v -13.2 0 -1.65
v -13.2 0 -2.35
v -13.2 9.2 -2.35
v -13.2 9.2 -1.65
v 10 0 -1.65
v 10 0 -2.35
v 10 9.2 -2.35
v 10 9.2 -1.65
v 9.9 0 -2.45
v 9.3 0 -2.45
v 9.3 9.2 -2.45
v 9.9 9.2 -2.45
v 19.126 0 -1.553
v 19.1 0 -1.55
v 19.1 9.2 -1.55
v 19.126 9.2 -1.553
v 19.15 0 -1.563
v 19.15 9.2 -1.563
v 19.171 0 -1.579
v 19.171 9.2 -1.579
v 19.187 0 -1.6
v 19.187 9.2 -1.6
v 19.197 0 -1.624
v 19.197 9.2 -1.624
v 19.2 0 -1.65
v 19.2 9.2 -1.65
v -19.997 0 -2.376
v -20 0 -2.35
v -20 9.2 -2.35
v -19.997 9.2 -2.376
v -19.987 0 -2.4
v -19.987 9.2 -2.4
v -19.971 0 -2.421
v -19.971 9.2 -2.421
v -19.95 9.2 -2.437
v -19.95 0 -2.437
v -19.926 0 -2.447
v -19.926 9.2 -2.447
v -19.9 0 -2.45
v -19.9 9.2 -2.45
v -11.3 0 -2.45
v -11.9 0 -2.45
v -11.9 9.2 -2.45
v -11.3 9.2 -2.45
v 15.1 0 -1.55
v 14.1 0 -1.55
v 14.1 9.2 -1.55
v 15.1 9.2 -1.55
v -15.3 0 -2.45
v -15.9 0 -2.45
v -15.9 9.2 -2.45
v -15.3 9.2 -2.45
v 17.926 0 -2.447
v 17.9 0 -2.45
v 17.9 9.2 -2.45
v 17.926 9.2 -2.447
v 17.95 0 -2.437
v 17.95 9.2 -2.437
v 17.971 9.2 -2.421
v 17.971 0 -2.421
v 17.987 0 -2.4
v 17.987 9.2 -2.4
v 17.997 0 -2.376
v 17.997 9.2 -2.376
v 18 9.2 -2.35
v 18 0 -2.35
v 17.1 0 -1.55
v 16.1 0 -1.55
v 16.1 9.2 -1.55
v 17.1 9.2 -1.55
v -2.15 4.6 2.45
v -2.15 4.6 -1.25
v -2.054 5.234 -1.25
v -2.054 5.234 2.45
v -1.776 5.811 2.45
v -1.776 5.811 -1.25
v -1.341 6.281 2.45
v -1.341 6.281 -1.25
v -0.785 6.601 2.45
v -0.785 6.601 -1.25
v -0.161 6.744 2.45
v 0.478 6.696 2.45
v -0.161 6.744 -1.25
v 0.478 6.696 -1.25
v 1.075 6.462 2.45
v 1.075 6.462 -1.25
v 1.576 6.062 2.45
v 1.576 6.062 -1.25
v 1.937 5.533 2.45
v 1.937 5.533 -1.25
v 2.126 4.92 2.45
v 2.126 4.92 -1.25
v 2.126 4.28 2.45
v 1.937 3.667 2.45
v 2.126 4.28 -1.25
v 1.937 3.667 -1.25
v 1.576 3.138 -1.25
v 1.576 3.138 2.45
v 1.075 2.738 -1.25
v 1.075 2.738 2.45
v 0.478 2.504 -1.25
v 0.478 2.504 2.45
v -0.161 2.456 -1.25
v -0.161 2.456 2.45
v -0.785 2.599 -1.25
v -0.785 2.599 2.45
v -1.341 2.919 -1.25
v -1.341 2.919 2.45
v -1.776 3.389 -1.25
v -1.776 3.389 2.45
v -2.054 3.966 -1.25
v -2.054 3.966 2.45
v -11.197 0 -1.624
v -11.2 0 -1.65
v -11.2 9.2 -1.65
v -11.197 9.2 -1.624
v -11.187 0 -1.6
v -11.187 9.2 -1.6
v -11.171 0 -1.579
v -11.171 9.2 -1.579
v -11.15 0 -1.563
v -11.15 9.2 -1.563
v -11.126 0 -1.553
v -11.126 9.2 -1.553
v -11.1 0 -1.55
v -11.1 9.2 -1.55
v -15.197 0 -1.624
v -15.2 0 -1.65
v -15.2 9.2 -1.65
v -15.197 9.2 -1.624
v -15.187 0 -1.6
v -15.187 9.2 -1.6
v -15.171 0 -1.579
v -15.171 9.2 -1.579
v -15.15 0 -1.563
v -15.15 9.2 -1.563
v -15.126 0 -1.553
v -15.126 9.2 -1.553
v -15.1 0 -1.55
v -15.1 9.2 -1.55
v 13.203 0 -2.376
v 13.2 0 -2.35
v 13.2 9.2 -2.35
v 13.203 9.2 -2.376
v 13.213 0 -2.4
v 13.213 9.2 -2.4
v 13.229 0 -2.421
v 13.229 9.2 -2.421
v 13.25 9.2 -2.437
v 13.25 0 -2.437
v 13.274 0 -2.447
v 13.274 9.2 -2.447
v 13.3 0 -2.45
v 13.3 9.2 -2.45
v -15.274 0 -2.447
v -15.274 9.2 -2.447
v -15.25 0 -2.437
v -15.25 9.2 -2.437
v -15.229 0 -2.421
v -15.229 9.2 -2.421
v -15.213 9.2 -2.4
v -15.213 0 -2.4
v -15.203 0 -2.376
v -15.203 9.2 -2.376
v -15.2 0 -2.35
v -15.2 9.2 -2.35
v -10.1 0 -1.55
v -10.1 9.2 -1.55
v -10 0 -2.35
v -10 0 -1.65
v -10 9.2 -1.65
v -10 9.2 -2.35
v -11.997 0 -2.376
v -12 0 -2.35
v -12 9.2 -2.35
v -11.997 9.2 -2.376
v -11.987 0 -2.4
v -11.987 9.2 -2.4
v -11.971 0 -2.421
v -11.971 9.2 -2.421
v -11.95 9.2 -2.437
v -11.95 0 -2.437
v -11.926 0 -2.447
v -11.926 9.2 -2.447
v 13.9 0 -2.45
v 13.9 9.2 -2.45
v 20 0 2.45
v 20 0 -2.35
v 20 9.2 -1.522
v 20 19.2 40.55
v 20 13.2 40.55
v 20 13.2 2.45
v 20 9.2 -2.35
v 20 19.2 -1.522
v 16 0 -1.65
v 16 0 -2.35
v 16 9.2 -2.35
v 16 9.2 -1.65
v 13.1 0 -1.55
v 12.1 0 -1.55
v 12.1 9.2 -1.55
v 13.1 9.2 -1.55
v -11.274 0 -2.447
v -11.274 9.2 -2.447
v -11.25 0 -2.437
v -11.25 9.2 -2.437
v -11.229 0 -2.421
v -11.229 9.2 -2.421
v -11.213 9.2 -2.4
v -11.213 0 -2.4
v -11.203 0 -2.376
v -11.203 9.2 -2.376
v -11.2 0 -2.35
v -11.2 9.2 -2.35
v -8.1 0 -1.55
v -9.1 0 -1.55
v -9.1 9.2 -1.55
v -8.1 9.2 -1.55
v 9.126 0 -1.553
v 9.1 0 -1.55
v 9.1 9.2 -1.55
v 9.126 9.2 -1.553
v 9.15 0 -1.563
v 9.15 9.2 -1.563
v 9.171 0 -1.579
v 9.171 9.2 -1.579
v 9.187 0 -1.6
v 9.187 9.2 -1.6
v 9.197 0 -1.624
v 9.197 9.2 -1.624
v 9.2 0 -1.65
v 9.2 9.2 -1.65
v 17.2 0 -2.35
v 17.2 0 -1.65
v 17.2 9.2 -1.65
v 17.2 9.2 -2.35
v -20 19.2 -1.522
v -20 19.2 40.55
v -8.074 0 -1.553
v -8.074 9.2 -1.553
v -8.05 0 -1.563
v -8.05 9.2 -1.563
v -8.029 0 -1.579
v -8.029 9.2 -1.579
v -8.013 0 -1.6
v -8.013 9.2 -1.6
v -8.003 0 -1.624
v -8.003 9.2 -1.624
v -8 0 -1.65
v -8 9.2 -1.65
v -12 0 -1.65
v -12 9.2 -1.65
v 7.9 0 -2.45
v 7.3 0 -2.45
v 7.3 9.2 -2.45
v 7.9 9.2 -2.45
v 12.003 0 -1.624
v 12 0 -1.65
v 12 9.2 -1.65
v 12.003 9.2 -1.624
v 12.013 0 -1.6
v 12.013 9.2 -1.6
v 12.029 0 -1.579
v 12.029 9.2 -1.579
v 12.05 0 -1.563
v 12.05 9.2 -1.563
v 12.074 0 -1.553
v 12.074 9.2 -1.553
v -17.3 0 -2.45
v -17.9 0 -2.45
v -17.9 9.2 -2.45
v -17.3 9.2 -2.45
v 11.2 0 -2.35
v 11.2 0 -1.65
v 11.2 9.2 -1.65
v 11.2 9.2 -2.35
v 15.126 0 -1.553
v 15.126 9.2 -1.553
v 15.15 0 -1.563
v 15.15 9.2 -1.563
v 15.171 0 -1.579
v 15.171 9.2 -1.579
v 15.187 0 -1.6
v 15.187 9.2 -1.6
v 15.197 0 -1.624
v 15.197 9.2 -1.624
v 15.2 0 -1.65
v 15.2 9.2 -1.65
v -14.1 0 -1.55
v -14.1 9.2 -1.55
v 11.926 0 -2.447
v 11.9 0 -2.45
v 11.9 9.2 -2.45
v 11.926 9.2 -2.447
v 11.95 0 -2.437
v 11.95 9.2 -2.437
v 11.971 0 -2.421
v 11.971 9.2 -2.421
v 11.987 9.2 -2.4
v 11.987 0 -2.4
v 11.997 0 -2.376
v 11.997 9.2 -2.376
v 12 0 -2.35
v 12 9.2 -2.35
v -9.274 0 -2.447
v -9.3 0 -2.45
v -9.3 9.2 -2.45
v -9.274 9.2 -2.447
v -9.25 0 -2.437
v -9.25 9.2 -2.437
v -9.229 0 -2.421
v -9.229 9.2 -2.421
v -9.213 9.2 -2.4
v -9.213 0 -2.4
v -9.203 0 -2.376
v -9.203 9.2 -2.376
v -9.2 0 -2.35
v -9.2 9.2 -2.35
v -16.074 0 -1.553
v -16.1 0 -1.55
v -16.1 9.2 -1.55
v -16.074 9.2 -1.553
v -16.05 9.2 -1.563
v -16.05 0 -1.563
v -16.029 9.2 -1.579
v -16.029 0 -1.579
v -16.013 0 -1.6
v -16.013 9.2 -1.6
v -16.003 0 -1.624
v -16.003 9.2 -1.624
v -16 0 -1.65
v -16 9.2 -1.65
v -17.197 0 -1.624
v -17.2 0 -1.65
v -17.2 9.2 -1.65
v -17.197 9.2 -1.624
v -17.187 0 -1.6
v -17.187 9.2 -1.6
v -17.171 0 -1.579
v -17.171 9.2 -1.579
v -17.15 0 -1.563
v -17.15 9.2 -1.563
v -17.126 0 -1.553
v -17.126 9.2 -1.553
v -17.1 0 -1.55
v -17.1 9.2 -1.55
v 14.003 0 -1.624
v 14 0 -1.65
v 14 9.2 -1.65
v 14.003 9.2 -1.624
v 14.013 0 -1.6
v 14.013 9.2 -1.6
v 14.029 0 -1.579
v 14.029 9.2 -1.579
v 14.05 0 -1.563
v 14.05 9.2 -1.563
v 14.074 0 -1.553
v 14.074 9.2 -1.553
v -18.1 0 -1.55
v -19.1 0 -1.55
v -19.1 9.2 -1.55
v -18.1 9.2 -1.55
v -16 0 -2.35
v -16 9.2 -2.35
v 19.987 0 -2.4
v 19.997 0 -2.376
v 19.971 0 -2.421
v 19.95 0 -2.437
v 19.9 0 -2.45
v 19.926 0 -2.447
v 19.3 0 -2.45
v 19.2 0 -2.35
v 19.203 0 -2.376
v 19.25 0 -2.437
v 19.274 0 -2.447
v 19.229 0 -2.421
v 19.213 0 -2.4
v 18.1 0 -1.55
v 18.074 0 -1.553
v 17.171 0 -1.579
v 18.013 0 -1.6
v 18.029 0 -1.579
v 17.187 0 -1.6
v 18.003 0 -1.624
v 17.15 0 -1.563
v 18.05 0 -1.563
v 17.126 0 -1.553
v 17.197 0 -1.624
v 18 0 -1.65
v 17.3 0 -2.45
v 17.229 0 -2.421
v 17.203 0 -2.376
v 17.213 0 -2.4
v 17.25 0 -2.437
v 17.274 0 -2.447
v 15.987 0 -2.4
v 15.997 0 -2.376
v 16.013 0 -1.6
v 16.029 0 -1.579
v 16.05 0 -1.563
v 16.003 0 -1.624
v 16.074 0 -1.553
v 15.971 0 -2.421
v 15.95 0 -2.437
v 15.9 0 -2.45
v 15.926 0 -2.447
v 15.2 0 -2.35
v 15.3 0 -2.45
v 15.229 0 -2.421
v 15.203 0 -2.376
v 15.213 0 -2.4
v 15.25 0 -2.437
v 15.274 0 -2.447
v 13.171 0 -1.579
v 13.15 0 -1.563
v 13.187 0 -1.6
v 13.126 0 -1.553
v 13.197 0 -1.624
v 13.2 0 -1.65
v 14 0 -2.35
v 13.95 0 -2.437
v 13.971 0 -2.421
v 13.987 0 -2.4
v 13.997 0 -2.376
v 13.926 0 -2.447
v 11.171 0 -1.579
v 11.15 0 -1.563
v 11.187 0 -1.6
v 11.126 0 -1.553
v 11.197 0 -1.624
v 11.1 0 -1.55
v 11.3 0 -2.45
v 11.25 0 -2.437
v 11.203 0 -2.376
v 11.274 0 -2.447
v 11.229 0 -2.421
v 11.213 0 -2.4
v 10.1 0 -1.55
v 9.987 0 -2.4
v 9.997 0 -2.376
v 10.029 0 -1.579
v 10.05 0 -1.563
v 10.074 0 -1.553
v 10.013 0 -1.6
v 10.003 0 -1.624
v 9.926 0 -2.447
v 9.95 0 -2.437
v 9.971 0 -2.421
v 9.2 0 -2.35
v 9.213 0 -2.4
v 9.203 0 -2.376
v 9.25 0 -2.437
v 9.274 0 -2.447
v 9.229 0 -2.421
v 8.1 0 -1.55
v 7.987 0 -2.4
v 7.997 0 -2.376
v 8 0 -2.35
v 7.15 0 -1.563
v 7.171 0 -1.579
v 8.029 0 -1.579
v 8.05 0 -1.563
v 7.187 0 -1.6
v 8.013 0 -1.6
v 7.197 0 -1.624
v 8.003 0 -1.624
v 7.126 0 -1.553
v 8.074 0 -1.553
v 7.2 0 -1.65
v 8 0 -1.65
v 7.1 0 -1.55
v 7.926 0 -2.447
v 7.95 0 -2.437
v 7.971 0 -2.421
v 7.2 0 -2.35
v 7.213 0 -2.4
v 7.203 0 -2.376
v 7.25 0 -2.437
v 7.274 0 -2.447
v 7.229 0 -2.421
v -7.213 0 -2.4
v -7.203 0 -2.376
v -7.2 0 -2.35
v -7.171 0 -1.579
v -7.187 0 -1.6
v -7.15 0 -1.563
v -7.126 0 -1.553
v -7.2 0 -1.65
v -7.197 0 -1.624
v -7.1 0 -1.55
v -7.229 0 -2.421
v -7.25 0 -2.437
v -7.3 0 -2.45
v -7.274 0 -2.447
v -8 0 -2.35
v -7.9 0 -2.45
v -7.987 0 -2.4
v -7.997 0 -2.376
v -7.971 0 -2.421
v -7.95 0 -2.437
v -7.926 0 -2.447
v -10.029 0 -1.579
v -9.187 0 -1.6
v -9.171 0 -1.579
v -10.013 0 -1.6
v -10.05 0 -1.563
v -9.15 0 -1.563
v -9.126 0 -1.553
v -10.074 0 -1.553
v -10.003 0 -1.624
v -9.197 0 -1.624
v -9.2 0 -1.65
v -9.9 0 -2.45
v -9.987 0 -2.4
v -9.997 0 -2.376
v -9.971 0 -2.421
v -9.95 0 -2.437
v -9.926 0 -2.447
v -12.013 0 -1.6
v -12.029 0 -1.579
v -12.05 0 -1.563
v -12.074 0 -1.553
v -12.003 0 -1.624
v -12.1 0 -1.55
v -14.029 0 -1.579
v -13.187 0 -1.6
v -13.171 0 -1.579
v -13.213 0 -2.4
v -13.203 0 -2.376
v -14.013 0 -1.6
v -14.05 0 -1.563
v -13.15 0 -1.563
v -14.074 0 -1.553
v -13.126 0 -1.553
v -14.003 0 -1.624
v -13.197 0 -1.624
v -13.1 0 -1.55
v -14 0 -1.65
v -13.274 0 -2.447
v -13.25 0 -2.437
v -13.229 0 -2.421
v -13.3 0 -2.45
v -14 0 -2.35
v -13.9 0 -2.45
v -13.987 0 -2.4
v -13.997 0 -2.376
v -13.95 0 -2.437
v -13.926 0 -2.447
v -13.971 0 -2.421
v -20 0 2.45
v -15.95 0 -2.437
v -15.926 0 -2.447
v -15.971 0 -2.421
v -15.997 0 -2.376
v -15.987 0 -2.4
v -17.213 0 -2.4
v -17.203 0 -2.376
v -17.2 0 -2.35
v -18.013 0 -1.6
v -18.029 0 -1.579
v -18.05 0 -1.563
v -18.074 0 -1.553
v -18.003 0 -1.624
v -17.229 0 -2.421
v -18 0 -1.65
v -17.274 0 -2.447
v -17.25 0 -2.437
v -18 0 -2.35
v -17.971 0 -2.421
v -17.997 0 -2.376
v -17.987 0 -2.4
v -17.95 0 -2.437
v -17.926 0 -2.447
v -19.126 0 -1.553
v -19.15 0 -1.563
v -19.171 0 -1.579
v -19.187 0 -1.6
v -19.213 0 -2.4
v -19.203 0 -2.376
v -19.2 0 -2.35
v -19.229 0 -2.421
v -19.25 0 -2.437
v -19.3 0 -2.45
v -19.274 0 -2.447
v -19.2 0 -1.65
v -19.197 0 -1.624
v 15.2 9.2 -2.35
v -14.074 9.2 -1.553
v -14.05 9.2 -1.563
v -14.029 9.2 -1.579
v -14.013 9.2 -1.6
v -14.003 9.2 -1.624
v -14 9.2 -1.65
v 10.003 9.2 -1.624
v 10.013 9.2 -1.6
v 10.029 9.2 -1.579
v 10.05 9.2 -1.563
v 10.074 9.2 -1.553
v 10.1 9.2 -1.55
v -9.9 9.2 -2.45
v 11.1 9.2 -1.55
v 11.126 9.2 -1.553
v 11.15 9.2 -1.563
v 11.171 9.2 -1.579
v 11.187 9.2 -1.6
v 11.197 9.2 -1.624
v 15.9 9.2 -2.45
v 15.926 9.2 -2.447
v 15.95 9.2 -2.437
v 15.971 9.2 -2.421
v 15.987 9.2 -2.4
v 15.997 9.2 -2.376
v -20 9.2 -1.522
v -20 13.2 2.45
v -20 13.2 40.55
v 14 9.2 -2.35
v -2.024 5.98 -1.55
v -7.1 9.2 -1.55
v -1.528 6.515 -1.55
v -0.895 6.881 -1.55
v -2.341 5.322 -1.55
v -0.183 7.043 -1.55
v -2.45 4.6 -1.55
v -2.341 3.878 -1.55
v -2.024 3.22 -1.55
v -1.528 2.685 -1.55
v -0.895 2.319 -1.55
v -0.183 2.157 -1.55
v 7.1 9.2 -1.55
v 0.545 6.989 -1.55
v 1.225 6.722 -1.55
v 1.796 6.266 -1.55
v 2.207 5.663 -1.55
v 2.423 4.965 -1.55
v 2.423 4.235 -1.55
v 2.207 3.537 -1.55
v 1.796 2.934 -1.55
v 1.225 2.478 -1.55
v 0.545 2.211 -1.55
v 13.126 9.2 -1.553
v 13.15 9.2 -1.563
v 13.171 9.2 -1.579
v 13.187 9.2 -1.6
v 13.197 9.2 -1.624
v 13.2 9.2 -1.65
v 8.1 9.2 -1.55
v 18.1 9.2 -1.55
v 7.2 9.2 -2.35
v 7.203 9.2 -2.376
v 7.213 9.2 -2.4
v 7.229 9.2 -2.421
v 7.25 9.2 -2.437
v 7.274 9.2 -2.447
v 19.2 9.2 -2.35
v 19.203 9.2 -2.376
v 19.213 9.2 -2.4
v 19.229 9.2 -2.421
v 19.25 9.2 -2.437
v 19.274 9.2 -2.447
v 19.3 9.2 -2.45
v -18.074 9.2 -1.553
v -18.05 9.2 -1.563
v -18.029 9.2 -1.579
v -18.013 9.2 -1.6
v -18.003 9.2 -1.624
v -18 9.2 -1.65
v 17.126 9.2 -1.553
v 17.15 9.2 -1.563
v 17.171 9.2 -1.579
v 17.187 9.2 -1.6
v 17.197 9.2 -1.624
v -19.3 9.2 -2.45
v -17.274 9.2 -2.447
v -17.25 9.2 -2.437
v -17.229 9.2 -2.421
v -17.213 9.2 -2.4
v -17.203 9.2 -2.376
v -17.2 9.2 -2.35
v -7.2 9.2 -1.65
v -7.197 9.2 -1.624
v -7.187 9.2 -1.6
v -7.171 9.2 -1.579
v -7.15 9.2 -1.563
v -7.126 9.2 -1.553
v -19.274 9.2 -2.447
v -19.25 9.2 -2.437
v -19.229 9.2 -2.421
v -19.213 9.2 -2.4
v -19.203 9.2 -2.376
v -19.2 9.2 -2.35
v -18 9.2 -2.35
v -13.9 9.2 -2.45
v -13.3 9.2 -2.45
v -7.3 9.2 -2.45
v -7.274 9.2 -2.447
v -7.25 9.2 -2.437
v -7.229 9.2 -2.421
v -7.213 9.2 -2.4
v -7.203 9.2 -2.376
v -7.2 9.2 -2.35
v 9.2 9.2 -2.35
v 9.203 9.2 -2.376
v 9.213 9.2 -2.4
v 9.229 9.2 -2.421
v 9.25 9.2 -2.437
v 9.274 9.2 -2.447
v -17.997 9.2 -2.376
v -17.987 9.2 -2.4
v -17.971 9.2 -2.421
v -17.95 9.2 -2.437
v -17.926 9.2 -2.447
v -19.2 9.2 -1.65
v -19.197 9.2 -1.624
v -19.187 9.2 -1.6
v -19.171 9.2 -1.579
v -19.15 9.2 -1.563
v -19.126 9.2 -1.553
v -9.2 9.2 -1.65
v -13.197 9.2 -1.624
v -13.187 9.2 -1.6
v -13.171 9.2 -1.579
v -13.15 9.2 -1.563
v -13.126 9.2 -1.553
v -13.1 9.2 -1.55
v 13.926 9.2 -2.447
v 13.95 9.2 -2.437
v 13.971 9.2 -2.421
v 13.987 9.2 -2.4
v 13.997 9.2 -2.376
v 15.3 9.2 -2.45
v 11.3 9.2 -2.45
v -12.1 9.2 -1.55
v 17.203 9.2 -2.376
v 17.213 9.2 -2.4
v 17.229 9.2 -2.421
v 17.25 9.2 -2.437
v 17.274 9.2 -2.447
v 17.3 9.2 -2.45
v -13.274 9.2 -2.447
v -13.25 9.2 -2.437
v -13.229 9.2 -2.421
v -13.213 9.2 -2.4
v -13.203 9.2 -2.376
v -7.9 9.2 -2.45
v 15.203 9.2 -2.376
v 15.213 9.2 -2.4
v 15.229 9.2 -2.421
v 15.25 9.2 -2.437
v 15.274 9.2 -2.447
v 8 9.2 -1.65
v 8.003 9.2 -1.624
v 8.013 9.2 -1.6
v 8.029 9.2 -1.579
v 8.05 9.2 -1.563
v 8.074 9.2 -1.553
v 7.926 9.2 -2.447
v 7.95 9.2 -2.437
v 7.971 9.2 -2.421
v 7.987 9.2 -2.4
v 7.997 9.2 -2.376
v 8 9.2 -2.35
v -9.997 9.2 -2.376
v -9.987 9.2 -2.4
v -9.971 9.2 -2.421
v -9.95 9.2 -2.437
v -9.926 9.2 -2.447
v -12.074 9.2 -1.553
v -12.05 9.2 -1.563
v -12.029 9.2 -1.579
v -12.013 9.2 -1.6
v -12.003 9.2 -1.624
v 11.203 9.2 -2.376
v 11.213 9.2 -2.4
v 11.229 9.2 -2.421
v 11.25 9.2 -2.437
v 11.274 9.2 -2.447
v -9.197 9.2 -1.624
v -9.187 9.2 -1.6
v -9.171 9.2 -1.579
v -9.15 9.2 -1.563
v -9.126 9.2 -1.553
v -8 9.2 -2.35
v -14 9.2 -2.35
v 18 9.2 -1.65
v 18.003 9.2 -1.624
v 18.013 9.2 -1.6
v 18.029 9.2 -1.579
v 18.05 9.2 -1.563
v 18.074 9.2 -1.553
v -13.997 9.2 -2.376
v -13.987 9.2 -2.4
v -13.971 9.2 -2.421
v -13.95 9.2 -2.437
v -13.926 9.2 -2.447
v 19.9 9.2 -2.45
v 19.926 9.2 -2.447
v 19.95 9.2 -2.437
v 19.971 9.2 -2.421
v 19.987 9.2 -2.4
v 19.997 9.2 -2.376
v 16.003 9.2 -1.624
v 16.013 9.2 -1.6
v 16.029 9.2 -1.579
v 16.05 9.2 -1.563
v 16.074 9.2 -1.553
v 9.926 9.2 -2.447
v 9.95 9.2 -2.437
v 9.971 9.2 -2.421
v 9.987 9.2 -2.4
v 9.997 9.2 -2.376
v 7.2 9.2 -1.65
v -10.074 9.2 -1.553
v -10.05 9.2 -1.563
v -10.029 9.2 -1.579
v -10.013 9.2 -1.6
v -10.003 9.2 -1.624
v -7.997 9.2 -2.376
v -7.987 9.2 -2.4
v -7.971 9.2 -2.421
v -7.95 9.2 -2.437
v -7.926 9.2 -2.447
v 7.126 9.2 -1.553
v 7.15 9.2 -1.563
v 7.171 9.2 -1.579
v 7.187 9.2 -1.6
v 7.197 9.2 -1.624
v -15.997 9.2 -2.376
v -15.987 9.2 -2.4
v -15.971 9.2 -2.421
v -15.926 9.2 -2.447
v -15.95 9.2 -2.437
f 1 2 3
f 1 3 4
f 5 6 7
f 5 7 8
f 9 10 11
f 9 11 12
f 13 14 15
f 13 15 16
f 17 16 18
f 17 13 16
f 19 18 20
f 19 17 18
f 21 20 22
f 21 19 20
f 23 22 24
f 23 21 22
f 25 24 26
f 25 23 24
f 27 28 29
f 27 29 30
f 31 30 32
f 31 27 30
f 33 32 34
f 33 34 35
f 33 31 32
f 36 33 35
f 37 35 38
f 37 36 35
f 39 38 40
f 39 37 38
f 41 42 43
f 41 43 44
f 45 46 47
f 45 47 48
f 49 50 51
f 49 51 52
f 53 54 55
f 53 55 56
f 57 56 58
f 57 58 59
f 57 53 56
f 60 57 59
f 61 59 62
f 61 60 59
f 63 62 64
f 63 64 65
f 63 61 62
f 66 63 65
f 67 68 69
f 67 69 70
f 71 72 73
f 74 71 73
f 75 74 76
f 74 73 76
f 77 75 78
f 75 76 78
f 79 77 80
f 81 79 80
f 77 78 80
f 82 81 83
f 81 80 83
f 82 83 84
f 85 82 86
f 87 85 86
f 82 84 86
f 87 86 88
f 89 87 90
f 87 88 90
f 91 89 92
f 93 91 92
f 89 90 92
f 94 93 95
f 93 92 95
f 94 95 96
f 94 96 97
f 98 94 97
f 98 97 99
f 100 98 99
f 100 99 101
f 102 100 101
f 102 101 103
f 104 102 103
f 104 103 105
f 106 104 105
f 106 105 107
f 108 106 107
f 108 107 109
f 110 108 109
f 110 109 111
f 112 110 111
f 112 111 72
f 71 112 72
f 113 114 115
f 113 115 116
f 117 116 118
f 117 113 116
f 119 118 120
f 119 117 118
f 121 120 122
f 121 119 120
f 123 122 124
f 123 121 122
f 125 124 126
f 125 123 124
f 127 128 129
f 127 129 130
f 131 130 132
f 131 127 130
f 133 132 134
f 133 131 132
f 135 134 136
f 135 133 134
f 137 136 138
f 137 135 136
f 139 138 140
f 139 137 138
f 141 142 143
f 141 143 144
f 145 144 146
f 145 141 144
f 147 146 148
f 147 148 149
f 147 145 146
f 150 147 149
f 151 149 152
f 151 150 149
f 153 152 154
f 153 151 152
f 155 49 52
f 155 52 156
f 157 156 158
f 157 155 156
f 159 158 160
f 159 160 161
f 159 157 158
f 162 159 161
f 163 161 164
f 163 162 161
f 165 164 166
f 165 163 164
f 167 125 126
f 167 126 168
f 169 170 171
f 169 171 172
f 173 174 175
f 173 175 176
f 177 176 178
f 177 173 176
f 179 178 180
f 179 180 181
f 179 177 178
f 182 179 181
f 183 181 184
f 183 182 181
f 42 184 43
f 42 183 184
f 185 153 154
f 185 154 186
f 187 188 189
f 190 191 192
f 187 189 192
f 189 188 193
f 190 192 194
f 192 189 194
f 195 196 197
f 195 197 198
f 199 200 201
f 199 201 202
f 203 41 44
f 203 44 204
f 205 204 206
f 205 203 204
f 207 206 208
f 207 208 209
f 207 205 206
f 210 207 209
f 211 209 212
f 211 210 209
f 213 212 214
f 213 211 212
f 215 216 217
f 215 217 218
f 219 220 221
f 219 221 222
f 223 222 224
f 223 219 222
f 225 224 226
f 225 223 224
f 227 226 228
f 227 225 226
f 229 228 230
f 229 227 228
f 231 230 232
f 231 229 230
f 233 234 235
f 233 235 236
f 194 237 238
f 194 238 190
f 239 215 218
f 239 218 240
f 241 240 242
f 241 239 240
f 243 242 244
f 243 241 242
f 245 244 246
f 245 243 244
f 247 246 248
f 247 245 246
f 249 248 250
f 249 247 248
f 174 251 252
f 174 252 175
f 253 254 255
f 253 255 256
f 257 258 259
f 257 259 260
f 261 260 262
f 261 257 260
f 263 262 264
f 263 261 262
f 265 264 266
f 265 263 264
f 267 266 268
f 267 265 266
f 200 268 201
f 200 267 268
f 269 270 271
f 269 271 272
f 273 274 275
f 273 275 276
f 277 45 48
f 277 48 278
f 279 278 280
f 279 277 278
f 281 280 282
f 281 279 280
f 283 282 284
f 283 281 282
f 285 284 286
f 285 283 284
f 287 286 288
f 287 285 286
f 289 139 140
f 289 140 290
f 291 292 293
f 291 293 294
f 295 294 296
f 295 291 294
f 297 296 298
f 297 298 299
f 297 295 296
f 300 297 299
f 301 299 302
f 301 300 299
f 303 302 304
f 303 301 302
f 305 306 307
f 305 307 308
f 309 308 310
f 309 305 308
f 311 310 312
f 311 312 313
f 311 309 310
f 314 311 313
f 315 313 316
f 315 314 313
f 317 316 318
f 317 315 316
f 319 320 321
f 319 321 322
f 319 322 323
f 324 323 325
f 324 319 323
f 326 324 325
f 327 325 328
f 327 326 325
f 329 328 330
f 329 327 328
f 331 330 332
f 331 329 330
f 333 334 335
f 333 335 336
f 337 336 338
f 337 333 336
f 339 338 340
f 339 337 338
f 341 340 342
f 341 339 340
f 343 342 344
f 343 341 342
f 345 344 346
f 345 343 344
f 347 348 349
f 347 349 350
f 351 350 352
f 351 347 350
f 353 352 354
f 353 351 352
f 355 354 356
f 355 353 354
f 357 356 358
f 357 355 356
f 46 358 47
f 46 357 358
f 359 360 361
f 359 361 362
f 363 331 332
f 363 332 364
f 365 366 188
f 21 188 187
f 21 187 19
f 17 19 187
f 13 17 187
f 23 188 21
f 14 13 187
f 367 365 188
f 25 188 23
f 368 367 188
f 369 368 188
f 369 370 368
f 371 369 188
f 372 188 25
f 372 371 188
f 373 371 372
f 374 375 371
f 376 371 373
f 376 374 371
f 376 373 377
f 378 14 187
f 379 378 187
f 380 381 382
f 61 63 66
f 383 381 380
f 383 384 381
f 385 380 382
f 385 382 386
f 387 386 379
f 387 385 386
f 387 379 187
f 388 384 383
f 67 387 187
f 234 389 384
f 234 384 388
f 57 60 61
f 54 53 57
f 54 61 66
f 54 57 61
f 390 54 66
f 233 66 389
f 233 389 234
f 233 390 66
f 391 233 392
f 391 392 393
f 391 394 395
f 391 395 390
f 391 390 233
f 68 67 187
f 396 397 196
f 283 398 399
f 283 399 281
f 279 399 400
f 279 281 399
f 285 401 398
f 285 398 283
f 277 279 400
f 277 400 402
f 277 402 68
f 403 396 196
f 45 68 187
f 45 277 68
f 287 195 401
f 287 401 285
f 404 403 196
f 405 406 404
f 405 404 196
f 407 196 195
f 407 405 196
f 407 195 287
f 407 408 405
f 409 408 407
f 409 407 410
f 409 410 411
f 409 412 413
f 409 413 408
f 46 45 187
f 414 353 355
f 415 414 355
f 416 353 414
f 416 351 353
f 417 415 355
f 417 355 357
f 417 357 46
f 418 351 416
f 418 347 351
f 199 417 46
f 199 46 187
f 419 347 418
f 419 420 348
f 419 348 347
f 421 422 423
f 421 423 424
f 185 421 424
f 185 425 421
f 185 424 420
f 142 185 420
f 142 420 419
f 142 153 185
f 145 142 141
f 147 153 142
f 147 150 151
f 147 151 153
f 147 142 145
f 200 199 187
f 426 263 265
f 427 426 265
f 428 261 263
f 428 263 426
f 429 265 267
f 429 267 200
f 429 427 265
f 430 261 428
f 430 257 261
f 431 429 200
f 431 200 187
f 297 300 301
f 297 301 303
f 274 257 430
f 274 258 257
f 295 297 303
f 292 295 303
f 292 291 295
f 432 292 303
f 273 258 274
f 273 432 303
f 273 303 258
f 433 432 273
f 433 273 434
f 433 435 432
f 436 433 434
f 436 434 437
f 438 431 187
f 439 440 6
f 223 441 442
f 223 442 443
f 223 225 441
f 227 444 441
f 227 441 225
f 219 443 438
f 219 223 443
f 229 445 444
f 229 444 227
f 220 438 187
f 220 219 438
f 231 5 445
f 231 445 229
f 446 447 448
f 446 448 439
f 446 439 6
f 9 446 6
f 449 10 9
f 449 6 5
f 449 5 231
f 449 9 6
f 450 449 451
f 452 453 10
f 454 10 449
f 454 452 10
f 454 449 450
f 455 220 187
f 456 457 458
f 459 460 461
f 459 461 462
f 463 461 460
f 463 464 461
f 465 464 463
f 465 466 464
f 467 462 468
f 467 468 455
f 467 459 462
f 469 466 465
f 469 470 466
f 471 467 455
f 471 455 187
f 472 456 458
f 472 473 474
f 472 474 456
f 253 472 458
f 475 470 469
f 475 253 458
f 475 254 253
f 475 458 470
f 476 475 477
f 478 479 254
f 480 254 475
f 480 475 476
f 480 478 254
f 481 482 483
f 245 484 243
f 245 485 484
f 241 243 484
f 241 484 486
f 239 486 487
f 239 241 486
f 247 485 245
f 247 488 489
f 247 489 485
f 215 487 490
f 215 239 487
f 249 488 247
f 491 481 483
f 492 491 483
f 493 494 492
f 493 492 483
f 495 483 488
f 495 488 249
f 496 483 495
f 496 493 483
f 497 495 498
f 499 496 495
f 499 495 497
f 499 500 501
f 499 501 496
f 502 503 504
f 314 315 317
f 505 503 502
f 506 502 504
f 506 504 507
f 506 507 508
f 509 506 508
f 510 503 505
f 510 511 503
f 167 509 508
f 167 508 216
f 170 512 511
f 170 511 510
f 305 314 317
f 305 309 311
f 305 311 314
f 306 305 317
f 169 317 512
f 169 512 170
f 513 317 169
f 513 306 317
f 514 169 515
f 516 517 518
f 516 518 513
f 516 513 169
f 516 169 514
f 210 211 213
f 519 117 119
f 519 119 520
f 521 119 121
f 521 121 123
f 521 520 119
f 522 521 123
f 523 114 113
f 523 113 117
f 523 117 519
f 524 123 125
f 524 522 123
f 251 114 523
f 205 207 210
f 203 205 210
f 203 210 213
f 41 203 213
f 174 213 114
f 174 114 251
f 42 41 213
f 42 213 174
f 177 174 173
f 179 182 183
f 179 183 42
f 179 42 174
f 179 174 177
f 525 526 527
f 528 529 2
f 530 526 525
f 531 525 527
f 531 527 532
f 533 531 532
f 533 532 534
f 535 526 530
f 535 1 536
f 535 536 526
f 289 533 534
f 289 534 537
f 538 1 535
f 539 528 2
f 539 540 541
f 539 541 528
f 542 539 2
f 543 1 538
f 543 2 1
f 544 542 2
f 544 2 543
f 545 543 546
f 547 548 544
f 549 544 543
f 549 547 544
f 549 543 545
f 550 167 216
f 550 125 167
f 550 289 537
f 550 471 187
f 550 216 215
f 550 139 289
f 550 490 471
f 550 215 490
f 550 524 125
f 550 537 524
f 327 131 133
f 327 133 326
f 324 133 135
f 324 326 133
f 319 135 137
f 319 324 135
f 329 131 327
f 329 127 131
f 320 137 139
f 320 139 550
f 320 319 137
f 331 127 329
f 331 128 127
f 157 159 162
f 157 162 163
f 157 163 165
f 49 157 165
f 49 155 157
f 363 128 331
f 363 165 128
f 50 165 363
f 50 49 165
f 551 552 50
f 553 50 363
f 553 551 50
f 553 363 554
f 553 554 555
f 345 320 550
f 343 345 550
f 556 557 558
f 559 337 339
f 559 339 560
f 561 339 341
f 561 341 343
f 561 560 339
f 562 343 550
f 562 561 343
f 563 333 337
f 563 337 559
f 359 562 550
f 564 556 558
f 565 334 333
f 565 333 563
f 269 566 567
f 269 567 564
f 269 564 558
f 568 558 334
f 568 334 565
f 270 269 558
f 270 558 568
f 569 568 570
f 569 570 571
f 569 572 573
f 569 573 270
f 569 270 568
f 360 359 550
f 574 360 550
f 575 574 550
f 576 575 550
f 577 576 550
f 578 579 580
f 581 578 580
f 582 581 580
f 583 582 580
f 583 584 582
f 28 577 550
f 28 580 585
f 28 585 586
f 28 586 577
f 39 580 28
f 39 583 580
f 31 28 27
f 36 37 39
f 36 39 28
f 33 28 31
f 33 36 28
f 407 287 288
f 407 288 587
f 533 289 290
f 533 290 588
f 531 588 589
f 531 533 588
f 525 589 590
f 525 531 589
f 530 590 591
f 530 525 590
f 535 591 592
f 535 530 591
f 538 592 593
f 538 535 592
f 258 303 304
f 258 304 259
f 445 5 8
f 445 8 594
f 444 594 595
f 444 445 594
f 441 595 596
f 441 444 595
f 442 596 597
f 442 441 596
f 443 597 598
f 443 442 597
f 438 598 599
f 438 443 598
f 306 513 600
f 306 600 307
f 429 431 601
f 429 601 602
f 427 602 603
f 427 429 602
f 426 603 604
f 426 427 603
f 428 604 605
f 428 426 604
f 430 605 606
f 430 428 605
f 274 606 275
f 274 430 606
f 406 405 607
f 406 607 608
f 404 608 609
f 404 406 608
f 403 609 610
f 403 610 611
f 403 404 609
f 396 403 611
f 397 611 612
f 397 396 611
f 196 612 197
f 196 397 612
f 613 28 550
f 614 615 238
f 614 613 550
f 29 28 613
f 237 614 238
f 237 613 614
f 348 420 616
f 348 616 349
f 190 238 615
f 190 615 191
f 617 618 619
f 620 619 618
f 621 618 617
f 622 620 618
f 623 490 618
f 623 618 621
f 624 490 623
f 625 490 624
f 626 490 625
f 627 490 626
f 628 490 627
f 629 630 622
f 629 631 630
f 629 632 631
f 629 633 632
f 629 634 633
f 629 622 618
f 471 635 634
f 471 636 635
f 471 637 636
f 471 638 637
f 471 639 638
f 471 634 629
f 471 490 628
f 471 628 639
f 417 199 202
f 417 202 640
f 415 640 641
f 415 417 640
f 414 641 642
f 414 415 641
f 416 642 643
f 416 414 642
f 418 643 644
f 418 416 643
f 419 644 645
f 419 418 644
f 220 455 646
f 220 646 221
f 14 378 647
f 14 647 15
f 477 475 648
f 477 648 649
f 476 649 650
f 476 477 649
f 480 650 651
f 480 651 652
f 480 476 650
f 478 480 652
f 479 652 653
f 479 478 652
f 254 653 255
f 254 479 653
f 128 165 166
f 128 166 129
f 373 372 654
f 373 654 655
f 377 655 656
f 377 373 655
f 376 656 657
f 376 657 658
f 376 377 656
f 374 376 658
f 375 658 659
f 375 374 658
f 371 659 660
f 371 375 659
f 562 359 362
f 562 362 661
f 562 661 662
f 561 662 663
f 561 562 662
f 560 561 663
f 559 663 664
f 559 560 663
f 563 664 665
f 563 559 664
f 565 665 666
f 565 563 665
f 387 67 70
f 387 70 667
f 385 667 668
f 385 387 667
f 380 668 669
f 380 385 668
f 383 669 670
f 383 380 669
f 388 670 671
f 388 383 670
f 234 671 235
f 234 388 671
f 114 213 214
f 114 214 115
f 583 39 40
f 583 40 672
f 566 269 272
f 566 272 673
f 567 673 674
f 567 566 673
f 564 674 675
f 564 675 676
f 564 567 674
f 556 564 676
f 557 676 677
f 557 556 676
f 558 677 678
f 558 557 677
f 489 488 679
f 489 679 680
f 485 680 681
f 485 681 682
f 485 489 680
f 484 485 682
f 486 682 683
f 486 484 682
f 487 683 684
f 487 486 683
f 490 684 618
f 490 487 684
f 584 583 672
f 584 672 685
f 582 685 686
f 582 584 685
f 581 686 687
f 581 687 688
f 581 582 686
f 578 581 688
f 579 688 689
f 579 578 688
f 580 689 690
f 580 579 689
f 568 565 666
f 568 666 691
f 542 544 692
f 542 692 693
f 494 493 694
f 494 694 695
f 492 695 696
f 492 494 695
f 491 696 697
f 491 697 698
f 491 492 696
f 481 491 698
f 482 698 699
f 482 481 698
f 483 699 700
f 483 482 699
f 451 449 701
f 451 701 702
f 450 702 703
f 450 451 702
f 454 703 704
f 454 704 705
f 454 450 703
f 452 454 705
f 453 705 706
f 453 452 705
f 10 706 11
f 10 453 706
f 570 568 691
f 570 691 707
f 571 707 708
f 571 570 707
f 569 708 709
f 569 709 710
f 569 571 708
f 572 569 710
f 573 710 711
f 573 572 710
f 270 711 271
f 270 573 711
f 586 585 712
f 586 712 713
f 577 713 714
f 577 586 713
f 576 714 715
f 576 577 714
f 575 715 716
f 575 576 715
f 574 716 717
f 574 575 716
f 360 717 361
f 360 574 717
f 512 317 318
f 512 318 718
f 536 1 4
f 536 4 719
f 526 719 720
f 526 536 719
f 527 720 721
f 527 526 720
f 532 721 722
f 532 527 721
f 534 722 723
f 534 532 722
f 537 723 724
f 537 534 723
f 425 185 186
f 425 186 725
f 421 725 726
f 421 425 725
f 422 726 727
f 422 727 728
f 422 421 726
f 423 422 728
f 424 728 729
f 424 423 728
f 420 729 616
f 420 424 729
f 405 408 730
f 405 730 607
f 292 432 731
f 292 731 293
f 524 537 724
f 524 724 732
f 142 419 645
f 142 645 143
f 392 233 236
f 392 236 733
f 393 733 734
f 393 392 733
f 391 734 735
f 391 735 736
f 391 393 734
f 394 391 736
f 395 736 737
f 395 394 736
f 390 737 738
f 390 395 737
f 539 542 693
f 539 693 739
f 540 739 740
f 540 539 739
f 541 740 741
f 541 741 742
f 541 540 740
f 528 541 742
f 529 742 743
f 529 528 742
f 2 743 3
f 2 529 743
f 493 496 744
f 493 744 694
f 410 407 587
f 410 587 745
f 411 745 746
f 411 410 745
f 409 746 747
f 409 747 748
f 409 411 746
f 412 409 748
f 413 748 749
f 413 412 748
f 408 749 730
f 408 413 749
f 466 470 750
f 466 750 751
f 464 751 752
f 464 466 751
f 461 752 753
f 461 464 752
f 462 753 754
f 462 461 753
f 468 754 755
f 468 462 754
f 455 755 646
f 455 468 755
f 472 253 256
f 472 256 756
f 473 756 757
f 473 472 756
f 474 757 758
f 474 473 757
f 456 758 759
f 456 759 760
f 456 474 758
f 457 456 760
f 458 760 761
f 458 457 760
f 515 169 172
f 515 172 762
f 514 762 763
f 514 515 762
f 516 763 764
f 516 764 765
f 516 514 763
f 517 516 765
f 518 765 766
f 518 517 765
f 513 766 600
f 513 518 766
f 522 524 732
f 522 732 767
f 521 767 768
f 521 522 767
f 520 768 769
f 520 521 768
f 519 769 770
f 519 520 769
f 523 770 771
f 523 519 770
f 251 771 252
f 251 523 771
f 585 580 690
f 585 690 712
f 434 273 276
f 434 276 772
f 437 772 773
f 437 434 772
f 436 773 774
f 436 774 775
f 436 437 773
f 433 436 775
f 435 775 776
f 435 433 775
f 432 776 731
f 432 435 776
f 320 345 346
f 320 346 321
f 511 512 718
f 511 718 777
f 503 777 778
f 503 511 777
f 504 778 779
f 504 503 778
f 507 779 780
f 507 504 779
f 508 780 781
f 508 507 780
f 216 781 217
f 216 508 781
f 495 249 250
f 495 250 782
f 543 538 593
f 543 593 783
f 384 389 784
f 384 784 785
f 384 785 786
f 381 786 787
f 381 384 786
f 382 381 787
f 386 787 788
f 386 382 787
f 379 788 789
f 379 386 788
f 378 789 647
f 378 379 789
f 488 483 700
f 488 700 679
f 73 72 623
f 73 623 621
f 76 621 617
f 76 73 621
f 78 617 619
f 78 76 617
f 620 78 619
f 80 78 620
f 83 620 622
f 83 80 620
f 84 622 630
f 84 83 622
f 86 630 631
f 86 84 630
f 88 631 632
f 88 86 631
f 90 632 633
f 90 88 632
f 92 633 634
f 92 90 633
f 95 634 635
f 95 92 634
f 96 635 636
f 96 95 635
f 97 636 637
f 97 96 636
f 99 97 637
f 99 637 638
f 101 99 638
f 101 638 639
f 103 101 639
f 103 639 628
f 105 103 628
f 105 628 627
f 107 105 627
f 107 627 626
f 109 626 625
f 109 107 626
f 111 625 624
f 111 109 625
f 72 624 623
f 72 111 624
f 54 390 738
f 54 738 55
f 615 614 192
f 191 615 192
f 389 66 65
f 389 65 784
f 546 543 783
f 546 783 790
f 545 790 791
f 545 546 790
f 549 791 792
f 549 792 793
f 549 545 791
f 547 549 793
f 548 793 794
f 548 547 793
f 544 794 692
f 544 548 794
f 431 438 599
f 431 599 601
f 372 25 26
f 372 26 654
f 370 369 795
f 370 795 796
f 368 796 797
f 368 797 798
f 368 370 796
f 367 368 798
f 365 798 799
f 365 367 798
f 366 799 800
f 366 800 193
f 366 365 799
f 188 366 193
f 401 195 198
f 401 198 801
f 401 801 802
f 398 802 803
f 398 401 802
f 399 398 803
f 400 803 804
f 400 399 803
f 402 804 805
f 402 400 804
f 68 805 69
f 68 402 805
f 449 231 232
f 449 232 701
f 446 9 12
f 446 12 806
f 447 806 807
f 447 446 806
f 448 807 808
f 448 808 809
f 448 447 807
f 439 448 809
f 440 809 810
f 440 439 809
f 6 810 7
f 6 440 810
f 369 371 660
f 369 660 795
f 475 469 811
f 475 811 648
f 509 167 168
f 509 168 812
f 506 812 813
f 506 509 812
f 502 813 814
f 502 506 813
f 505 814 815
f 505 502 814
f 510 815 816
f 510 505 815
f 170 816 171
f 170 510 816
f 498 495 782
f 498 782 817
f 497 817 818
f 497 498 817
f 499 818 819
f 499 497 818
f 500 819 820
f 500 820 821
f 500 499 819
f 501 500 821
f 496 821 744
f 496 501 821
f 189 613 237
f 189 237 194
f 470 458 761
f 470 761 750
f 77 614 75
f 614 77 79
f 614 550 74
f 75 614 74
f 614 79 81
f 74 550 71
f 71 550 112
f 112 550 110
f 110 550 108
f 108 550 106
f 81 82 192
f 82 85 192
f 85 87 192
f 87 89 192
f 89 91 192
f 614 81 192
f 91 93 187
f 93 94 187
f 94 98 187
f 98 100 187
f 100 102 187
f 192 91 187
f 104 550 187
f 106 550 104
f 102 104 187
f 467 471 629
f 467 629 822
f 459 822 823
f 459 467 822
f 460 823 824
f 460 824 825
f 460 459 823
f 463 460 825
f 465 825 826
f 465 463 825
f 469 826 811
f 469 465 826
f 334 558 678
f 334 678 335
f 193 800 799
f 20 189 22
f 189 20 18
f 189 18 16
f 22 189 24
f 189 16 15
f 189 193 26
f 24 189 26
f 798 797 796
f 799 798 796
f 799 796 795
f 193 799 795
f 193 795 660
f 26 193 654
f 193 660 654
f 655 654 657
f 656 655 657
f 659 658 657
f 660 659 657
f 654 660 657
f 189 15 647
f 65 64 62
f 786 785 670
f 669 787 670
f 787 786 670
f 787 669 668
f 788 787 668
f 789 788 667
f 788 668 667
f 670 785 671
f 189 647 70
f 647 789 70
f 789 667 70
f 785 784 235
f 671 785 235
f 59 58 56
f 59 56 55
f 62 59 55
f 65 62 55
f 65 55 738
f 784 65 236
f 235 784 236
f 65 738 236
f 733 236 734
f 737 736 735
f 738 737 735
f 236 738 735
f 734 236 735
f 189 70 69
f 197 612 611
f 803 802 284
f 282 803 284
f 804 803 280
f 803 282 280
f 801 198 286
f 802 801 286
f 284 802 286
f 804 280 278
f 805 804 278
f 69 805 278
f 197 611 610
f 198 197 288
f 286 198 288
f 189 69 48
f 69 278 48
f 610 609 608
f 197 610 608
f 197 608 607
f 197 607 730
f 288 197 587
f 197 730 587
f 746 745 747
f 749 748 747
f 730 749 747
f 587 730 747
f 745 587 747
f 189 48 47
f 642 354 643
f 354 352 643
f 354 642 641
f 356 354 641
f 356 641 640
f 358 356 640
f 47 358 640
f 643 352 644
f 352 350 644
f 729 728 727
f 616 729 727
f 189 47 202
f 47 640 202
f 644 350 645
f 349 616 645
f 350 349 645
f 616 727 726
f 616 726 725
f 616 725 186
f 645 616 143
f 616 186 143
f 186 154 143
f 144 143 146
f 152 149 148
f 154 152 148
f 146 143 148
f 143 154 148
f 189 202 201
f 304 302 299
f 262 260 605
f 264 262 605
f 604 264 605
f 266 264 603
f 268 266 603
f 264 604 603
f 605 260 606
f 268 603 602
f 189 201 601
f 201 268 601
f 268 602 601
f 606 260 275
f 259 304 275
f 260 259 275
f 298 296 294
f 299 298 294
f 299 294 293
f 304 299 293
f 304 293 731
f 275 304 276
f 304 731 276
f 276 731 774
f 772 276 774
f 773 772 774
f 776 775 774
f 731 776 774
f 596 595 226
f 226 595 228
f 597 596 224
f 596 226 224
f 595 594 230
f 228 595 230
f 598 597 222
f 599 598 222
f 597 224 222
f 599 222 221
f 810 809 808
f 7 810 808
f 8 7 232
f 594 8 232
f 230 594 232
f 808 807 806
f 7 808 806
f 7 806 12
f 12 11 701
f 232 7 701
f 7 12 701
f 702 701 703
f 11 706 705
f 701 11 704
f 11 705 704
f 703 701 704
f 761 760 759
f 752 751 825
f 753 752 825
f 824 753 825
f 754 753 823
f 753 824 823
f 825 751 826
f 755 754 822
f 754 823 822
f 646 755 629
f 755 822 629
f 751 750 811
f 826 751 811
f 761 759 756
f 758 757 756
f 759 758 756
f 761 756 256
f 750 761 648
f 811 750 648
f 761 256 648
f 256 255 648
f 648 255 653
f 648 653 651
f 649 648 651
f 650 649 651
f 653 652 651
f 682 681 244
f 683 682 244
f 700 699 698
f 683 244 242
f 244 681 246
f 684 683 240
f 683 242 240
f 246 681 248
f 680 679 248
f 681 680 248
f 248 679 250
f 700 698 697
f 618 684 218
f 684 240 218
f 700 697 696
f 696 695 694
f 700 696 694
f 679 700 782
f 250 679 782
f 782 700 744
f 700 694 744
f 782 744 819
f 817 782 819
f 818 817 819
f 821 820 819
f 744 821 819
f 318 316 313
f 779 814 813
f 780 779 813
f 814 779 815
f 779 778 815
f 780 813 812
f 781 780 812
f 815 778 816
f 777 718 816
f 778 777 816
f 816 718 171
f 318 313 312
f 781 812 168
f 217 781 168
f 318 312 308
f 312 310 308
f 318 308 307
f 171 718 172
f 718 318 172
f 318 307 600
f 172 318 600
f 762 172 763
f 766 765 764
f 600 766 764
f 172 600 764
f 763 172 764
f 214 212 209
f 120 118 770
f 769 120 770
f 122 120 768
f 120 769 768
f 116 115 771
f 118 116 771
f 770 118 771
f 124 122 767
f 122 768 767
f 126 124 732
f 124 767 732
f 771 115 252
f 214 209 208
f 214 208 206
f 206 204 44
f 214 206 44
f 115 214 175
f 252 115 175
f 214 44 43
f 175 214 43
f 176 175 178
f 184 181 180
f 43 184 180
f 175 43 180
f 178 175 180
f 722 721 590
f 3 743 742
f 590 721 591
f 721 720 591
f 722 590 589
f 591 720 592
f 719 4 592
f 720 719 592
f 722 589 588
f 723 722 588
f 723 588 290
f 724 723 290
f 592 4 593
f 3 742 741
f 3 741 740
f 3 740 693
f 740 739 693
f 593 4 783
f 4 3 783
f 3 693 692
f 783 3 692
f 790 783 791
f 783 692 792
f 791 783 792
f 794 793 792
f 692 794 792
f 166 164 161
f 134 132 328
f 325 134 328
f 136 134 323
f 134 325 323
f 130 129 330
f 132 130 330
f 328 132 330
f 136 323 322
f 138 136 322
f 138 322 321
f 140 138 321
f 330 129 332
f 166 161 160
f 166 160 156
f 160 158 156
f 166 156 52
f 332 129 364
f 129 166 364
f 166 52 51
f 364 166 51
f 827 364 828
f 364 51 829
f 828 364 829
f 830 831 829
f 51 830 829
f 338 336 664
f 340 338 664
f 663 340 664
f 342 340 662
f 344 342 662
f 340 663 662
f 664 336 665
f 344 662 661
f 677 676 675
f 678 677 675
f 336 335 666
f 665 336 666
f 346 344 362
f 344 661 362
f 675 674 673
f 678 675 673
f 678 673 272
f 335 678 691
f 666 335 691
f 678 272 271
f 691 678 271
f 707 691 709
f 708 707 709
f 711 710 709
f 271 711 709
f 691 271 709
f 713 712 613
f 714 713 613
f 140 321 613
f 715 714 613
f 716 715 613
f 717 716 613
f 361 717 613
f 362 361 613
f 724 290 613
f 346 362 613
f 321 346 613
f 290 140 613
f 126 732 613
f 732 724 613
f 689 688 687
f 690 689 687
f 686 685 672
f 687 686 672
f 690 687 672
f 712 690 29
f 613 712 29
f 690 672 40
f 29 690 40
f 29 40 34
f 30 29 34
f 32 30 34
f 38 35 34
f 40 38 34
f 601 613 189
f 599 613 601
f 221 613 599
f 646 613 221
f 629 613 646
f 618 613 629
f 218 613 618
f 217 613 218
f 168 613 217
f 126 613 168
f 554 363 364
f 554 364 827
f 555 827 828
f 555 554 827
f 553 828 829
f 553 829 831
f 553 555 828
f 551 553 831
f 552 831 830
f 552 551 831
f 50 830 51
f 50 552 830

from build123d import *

# Parameters (mm, degrees)
RESSALTO_EXTRUS_O2_DEPTH = 9.2
ESBO_O5_R                = 2.15
CORTE_EXTRUS_O2_DEPTH    = 9.2
CHANFRO2_SIZE            = 0.3
SKETCH1_W                = 40
SKETCH1_H                = 3.972261678
BOSS_EXTRUDE1_DEPTH      = 10
SKETCH2_W                = 40
SKETCH2_H                = 6
BOSS_EXTRUDE2_DEPTH      = 38.1


with BuildPart() as part:
    # Esboço4 → Ressalto-extrusão2 (new body)
    with BuildSketch(Plane(origin=(0, 0, 0), x_dir=(1, 0, 0), z_dir=(0, 1, 0))):
        with BuildLine():
            Line((-19.2, 2.35), (-19.2, 1.65))
            ThreePointArc((-19.2, 1.65), (-19.170710678, 1.579289322), (-19.1, 1.55))
            Line((-19.1, 1.55), (-18.1, 1.55))
            ThreePointArc((-18.1, 1.55), (-18.029289322, 1.579289322), (-18, 1.65))
            Line((-18, 1.65), (-18, 2.35))
            ThreePointArc((-18, 2.35), (-17.970710678, 2.420710678), (-17.9, 2.45))
            Line((-17.9, 2.45), (-17.3, 2.45))
            ThreePointArc((-17.3, 2.45), (-17.229289322, 2.420710678), (-17.2, 2.35))
            Line((-17.2, 2.35), (-17.2, 1.65))
            ThreePointArc((-17.2, 1.65), (-17.170710678, 1.579289322), (-17.1, 1.55))
            Line((-17.1, 1.55), (-16.1, 1.55))
            ThreePointArc((-16.1, 1.55), (-16.029289322, 1.579289322), (-16, 1.65))
            Line((-16, 1.65), (-16, 2.35))
            ThreePointArc((-16, 2.35), (-15.970710678, 2.420710678), (-15.9, 2.45))
            Line((-15.9, 2.45), (-15.3, 2.45))
            ThreePointArc((-15.3, 2.45), (-15.229289322, 2.420710678), (-15.2, 2.35))
            Line((-15.2, 2.35), (-15.2, 1.65))
            ThreePointArc((-15.2, 1.65), (-15.170710678, 1.579289322), (-15.1, 1.55))
            Line((-15.1, 1.55), (-14.1, 1.55))
            ThreePointArc((-14.1, 1.55), (-14.029289322, 1.579289322), (-14, 1.65))
            Line((-14, 1.65), (-14, 2.35))
            ThreePointArc((-14, 2.35), (-13.970710678, 2.420710678), (-13.9, 2.45))
            Line((-13.9, 2.45), (-13.3, 2.45))
            ThreePointArc((-13.3, 2.45), (-13.229289322, 2.420710678), (-13.2, 2.35))
            Line((-13.2, 2.35), (-13.2, 1.65))
            ThreePointArc((-13.2, 1.65), (-13.170710678, 1.579289322), (-13.1, 1.55))
            Line((-13.1, 1.55), (-12.1, 1.55))
            ThreePointArc((-12.1, 1.55), (-12.029289322, 1.579289322), (-12, 1.65))
            Line((-12, 1.65), (-12, 2.35))
            ThreePointArc((-12, 2.35), (-11.970710678, 2.420710678), (-11.9, 2.45))
            Line((-11.9, 2.45), (-11.3, 2.45))
            ThreePointArc((-11.3, 2.45), (-11.229289322, 2.420710678), (-11.2, 2.35))
            Line((-11.2, 2.35), (-11.2, 1.65))
            ThreePointArc((-11.2, 1.65), (-11.170710678, 1.579289322), (-11.1, 1.55))
            Line((-11.1, 1.55), (-10.1, 1.55))
            ThreePointArc((-10.1, 1.55), (-10.029289322, 1.579289322), (-10, 1.65))
            Line((-10, 1.65), (-10, 2.35))
            ThreePointArc((-10, 2.35), (-9.970710678, 2.420710678), (-9.9, 2.45))
            Line((-9.9, 2.45), (-9.3, 2.45))
            ThreePointArc((-9.3, 2.45), (-9.229289322, 2.420710678), (-9.2, 2.35))
            Line((-9.2, 2.35), (-9.2, 1.65))
            ThreePointArc((-9.2, 1.65), (-9.170710678, 1.579289322), (-9.1, 1.55))
            Line((-9.1, 1.55), (-8.1, 1.55))
            ThreePointArc((-8.1, 1.55), (-8.029289322, 1.579289322), (-8, 1.65))
            Line((-8, 1.65), (-8, 2.35))
            ThreePointArc((-8, 2.35), (-7.970710678, 2.420710678), (-7.9, 2.45))
            Line((-7.9, 2.45), (-7.3, 2.45))
            ThreePointArc((-7.3, 2.45), (-7.229289322, 2.420710678), (-7.2, 2.35))
            Line((-7.2, 2.35), (-7.2, 1.65))
            ThreePointArc((-7.2, 1.65), (-7.170710678, 1.579289322), (-7.1, 1.55))
            Line((-7.1, 1.55), (7.1, 1.55))
            ThreePointArc((7.1, 1.55), (7.170710678, 1.579289322), (7.2, 1.65))
            Line((7.2, 1.65), (7.2, 2.35))
            ThreePointArc((7.2, 2.35), (7.229289322, 2.420710678), (7.3, 2.45))
            Line((7.3, 2.45), (7.9, 2.45))
            ThreePointArc((7.9, 2.45), (7.970710678, 2.420710678), (8, 2.35))
            Line((8, 2.35), (8, 1.65))
            ThreePointArc((8, 1.65), (8.029289322, 1.579289322), (8.1, 1.55))
            Line((8.1, 1.55), (9.1, 1.55))
            ThreePointArc((9.1, 1.55), (9.170710678, 1.579289322), (9.2, 1.65))
            Line((9.2, 1.65), (9.2, 2.35))
            ThreePointArc((9.2, 2.35), (9.229289322, 2.420710678), (9.3, 2.45))
            Line((9.3, 2.45), (9.9, 2.45))
            ThreePointArc((9.9, 2.45), (9.970710678, 2.420710678), (10, 2.35))
            Line((10, 2.35), (10, 1.65))
            ThreePointArc((10, 1.65), (10.029289322, 1.579289322), (10.1, 1.55))
            Line((10.1, 1.55), (11.1, 1.55))
            ThreePointArc((11.1, 1.55), (11.170710678, 1.579289322), (11.2, 1.65))
            Line((11.2, 1.65), (11.2, 2.35))
            ThreePointArc((11.2, 2.35), (11.229289322, 2.420710678), (11.3, 2.45))
            Line((11.3, 2.45), (11.9, 2.45))
            ThreePointArc((11.9, 2.45), (11.970710678, 2.420710678), (12, 2.35))
            Line((12, 2.35), (12, 1.65))
            ThreePointArc((12, 1.65), (12.029289322, 1.579289322), (12.1, 1.55))
            Line((12.1, 1.55), (13.1, 1.55))
            ThreePointArc((13.1, 1.55), (13.170710678, 1.579289322), (13.2, 1.65))
            Line((13.2, 1.65), (13.2, 2.35))
            ThreePointArc((13.2, 2.35), (13.229289322, 2.420710678), (13.3, 2.45))
            Line((13.3, 2.45), (13.9, 2.45))
            ThreePointArc((13.9, 2.45), (13.970710678, 2.420710678), (14, 2.35))
            Line((14, 2.35), (14, 1.65))
            ThreePointArc((14, 1.65), (14.029289322, 1.579289322), (14.1, 1.55))
            Line((14.1, 1.55), (15.1, 1.55))
            ThreePointArc((15.1, 1.55), (15.170710678, 1.579289322), (15.2, 1.65))
            Line((15.2, 1.65), (15.2, 2.35))
            ThreePointArc((15.2, 2.35), (15.229289322, 2.420710678), (15.3, 2.45))
            Line((15.3, 2.45), (15.9, 2.45))
            ThreePointArc((15.9, 2.45), (15.970710678, 2.420710678), (16, 2.35))
            Line((16, 2.35), (16, 1.65))
            ThreePointArc((16, 1.65), (16.029289322, 1.579289322), (16.1, 1.55))
            Line((16.1, 1.55), (17.1, 1.55))
            ThreePointArc((17.1, 1.55), (17.170710678, 1.579289322), (17.2, 1.65))
            Line((17.2, 1.65), (17.2, 2.35))
            ThreePointArc((17.2, 2.35), (17.229289322, 2.420710678), (17.3, 2.45))
            Line((17.3, 2.45), (17.9, 2.45))
            ThreePointArc((17.9, 2.45), (17.970710678, 2.420710678), (18, 2.35))
            Line((18, 2.35), (18, 1.65))
            ThreePointArc((18, 1.65), (18.029289322, 1.579289322), (18.1, 1.55))
            Line((18.1, 1.55), (19.1, 1.55))
            ThreePointArc((19.1, 1.55), (19.170710678, 1.579289322), (19.2, 1.65))
            Line((19.2, 1.65), (19.2, 2.35))
            ThreePointArc((19.2, 2.35), (19.229289322, 2.420710678), (19.3, 2.45))
            Line((19.3, 2.45), (19.9, 2.45))
            ThreePointArc((19.9, 2.45), (19.970710678, 2.420710678), (20, 2.35))
            Line((20, 2.35), (20, -2.45))
            Line((20, -2.45), (-20, -2.45))
            Line((-20, -2.45), (-20, 2.35))
            ThreePointArc((-20, 2.35), (-19.970710678, 2.420710678), (-19.9, 2.45))
            Line((-19.9, 2.45), (-19.3, 2.45))
            ThreePointArc((-19.3, 2.45), (-19.229289322, 2.420710678), (-19.2, 2.35))
        make_face()
    extrude(amount=RESSALTO_EXTRUS_O2_DEPTH)

    # Esboço5 → Corte-extrusão2 (cut)
    with BuildSketch(Plane(origin=(0, 0, -1.55), x_dir=(-1, 0, 0), z_dir=(0, 0, -1))):
        with Locations((0, 4.6)):
            Circle(ESBO_O5_R)
    extrude(amount=-CORTE_EXTRUS_O2_DEPTH, mode=Mode.SUBTRACT)

    # Chanfro2
    chanfro2_edges = [part.edges().sort_by_distance(p)[0] for p in [
        (2.15, 4.6, -1.55),
    ]]
    chamfer(chanfro2_edges, length=CHANFRO2_SIZE)

    # Sketch1 → Boss-Extrude1 (add)
    with BuildSketch(Plane(origin=(0, 9.2, 0), x_dir=(1, 0, 0), z_dir=(0, 1, 0))):
        with Locations((0, -0.463869161)):
            Rectangle(SKETCH1_W, SKETCH1_H)
    extrude(amount=BOSS_EXTRUDE1_DEPTH)

    # Sketch2 → Boss-Extrude2 (add)
    with BuildSketch(Plane.XY.offset(2.45)):
        with Locations((0, 16.2)):
            Rectangle(SKETCH2_W, SKETCH2_H)
    extrude(amount=BOSS_EXTRUDE2_DEPTH)


solid = part.part
